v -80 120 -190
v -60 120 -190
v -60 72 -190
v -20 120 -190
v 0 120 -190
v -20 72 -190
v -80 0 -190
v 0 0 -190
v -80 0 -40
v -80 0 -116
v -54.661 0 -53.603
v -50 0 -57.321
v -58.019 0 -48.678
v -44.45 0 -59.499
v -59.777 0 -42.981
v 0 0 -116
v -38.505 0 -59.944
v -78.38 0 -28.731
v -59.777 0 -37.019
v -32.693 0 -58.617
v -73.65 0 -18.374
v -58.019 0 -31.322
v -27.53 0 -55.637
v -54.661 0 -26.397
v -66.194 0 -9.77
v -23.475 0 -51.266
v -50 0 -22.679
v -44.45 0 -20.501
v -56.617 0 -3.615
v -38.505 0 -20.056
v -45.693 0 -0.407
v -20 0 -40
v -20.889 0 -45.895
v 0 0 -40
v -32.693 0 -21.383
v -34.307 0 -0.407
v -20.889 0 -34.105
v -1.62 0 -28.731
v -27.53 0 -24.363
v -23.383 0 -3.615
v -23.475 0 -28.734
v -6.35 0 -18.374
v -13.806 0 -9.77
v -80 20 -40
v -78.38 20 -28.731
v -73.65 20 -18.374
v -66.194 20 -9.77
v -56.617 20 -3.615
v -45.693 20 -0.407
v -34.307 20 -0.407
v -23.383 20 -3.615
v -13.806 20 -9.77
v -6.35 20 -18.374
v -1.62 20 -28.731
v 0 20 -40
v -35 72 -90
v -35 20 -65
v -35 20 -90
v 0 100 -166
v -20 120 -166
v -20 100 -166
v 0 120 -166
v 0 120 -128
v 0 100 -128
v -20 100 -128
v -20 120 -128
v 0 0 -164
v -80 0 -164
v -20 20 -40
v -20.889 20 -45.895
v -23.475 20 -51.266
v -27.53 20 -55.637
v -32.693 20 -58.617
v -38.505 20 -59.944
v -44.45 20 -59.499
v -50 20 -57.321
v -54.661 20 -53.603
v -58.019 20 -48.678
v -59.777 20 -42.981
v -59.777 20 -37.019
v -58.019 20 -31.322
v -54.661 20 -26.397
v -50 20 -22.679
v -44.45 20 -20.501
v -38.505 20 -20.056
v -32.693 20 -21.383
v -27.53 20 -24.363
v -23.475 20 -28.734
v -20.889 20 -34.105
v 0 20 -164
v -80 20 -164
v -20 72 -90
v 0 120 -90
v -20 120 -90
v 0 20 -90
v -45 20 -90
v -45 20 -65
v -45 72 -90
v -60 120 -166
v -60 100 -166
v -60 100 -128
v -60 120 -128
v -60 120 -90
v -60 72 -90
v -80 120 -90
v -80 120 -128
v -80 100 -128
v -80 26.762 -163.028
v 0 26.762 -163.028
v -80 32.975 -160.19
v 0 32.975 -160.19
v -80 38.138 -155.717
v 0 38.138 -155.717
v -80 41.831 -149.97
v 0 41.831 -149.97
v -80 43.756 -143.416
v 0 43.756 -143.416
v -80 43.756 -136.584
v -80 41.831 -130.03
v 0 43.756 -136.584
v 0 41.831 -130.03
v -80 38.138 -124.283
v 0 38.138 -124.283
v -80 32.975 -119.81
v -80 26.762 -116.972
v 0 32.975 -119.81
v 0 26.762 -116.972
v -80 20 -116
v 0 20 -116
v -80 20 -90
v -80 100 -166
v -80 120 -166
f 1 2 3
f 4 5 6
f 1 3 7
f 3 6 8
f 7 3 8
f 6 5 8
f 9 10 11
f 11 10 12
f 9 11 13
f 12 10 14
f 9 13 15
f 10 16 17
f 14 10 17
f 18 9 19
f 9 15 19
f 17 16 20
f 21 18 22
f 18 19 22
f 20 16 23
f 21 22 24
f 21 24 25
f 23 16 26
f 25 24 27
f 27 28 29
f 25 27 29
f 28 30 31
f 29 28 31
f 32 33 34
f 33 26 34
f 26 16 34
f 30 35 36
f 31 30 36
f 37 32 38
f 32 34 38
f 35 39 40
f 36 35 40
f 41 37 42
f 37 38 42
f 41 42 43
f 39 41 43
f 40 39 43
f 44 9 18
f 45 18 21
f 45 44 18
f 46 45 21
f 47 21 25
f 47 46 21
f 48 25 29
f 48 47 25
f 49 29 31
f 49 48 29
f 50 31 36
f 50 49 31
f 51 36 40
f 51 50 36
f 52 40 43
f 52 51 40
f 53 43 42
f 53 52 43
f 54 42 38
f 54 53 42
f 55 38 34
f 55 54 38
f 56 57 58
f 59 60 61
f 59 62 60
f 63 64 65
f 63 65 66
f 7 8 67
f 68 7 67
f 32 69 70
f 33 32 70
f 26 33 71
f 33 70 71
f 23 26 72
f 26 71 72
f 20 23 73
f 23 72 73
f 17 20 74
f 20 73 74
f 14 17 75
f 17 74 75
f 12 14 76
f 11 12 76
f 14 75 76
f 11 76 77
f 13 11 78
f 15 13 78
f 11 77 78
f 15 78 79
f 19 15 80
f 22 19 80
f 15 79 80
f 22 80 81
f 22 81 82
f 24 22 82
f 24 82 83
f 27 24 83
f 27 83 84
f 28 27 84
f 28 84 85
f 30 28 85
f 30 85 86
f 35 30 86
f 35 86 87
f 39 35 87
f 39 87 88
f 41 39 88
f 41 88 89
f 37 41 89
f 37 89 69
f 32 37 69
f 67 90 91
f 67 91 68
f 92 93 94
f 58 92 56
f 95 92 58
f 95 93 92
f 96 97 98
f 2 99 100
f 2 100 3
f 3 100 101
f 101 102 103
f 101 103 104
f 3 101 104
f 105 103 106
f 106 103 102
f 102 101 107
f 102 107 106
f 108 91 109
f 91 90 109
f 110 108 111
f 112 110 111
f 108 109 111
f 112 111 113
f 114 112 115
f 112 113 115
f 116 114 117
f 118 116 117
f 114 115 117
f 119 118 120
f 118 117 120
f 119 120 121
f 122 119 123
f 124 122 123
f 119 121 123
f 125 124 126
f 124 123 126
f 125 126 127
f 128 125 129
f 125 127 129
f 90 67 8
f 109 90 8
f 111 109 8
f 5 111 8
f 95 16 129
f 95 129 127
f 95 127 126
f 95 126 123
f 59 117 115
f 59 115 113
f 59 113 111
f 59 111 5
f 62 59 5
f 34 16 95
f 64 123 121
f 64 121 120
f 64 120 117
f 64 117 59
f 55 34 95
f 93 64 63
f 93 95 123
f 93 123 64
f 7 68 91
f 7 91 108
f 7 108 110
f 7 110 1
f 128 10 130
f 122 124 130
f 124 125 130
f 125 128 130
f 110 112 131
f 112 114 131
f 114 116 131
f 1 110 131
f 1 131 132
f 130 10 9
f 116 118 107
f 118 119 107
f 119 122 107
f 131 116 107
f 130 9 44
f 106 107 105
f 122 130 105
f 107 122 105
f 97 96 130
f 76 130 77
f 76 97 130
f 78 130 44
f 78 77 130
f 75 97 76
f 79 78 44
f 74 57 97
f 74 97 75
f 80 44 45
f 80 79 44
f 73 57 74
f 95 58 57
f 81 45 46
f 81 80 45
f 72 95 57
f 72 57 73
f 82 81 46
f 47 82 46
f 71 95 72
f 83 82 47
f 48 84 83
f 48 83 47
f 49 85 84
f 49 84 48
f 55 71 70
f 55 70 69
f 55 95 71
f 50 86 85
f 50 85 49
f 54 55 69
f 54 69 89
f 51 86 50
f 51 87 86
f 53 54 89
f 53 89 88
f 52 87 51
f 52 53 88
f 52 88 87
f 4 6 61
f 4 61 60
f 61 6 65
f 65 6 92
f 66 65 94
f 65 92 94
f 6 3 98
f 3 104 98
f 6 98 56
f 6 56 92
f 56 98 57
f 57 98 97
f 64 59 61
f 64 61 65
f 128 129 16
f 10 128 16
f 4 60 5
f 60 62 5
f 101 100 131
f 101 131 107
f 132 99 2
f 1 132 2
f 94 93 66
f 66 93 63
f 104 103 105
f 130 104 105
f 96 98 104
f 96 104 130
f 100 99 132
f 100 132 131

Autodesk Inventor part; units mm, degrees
ref_plane "XZ Plane" through (0, 0, 0) normal (0, 1, 0) x (-1, 0, 0)
ref_plane "XY Plane" through (0, 0, 0) normal (0, 0, 1) x (1, 0, 0)
sketch "Sketch1" plane through (0, 0, 0) normal (1, 0, 0) x (0, 1, 0)
  point P0 (0, 0)
sketch "Sketch2" plane through (0, 0, 0) normal (1, 0, 0) x (0, 1, 0)
  line L0 (0, 0) -> (120, 0)
  line L1 (120, 0) -> (120, -190)
  line L2 (120, -190) -> (0, -190)
  line L3 (0, -190) -> (0, 0)
  circle A0 centre (20, -140) radius 24
  line L4 (20, -164) -> (0, -164)
  line L5 (20, -116) -> (0, -116)
  line L6 (120, -190) -> (120, -166)
  line L7 (120, -166) -> (100, -166)
  line L8 (100, -166) -> (100, -128)
  line L9 (100, -128) -> (120, -128)
  line L10 (120, -128) -> (120, -90)
  line L11 (120, -90) -> (72, -90)
  line L12 (72, -90) -> (20, -90)
  line L13 (20, -90) -> (20, 0)
  line L14 (20, 0) -> (0, 0)
  line L15 (120, 0) -> (20, 0)
  point P0 (0, -126.7335)
  point P1 (0, -153.2665)
  dimension "d0" = 190
  dimension "d1" = 120
  dimension "d4" = 48
  dimension "d5" = 20
  dimension "d6" = 50
  dimension "d7" = 24
  dimension "d8" = 20
  dimension "d9" = 38
  dimension "d10" = 38
  dimension "d11" = 48
extrude "Extrusion1" add sketch "Sketch2" against normal blind 80 contours L0 L13 L12 L11 L1 L9 L8 L7 L2 L3 L4 A0 L5 | L0 L1 L11 L12 L13 | L5 A0 L3 | A0 L3 | A0 L4 L3 | L1 L7 L8 L9 picked at (15.1537, -135.0371)
extrude "Extrusion2" cut sketch "Sketch2" against normal blind 80 contours L0 L1 L11 L12 L13 | A0 L3 | L1 L7 L8 L9 picked at (15.1537, -135.0371)
extrude "Extrusion3" cut sketch "Sketch2" against normal blind 80 contours L5 A0 L3 | A0 L4 L3
sketch "Sketch3" plane through (-80, 20, -90) normal (0, 1, 0) x (1, 0, 0)
  line L0 (80, -90) -> (0, -90) projected
  line L1 (40, -90) -> (40, 100)
  line L2 (80, 100) -> (0, 100) projected
  circle A0 centre (40, -50) radius 20
  circle A1 centre (40, -50) radius 40
  line L3 (80, -90) -> (0, -90) projected
  line L4 (0, -90) -> (0, 0) projected
  line L5 (0, -90) -> (0, 100)
  line L6 (0, -90) -> (80, -90)
  line L7 (80, 74) -> (80, 100) projected
  line L8 (80, -90) -> (80, 100)
  point P0 (80, -50)
  point P1 (0, -50)
  dimension "d16" = 40
  dimension "d17" = 80
  dimension "d18" = 40
extrude "Extrusion4" cut sketch "Sketch3" against normal blind 80 contours L0 A1 L8 | L0 L4 A1 | A0 L1 | L1 A0
sketch "Sketch4" plane through (-80, 120, -90) normal (0, 0, 1) x (1, 0, 0)
  line L0 (0, 0) -> (0, -120) projected
  line L1 (80, 0) -> (80, -100) projected
  line L2 (0, 0) -> (80, 0)
  line L3 (80, 0) -> (80, -120)
  line L4 (0, -120) -> (80, -120) projected
  line L5 (80, -120) -> (0, -120)
  line L6 (0, -120) -> (0, 0)
  line L7 (80, 0) -> (0, 0) projected
  line L8 (40, 0) -> (40, -120)
  line L9 (0, 0) -> (0, -48)
  line L10 (0, 0) -> (20, 0)
  line L11 (20, 0) -> (20, -48)
  line L12 (20, -48) -> (60, -48)
  line L13 (60, -48) -> (60, 0)
  dimension "d21" = 48
  dimension "d22" = 20
  dimension "d23" = 40
  dimension "d24" = 48
extrude "Extrusion5" cut sketch "Sketch4" against normal blind 100 contours L2 L8 L12 L11 | L2 L13 L12 L8
ref_plane "Work Plane1" through (-40, 72, -90) normal (1, 0, 0) x (0, 1, 0)
sketch "Sketch5" plane through (-40, 72, -90) normal (1, 0, 0) x (0, 1, 0)
  line L0 (0, 0) -> (0, -100) projected
  line L1 (0, 0) -> (0, 25)
  line L2 (0, 25) -> (-52, 25)
  line L3 (0, 0) -> (-52, 25)
  line L4 (-52, 50) -> (-52, 0) projected
  line L5 (0, 0) -> (-52, 0)
  line L6 (-52, 0) -> (-52, 25)
  point P0 (-72, 90)
  dimension "d27" = 25
  dimension "d28" = 52
extrude "Extrusion6" add sketch "Sketch5" along normal mid plane 10 contours L5 L4 L3
properties part number "2"
